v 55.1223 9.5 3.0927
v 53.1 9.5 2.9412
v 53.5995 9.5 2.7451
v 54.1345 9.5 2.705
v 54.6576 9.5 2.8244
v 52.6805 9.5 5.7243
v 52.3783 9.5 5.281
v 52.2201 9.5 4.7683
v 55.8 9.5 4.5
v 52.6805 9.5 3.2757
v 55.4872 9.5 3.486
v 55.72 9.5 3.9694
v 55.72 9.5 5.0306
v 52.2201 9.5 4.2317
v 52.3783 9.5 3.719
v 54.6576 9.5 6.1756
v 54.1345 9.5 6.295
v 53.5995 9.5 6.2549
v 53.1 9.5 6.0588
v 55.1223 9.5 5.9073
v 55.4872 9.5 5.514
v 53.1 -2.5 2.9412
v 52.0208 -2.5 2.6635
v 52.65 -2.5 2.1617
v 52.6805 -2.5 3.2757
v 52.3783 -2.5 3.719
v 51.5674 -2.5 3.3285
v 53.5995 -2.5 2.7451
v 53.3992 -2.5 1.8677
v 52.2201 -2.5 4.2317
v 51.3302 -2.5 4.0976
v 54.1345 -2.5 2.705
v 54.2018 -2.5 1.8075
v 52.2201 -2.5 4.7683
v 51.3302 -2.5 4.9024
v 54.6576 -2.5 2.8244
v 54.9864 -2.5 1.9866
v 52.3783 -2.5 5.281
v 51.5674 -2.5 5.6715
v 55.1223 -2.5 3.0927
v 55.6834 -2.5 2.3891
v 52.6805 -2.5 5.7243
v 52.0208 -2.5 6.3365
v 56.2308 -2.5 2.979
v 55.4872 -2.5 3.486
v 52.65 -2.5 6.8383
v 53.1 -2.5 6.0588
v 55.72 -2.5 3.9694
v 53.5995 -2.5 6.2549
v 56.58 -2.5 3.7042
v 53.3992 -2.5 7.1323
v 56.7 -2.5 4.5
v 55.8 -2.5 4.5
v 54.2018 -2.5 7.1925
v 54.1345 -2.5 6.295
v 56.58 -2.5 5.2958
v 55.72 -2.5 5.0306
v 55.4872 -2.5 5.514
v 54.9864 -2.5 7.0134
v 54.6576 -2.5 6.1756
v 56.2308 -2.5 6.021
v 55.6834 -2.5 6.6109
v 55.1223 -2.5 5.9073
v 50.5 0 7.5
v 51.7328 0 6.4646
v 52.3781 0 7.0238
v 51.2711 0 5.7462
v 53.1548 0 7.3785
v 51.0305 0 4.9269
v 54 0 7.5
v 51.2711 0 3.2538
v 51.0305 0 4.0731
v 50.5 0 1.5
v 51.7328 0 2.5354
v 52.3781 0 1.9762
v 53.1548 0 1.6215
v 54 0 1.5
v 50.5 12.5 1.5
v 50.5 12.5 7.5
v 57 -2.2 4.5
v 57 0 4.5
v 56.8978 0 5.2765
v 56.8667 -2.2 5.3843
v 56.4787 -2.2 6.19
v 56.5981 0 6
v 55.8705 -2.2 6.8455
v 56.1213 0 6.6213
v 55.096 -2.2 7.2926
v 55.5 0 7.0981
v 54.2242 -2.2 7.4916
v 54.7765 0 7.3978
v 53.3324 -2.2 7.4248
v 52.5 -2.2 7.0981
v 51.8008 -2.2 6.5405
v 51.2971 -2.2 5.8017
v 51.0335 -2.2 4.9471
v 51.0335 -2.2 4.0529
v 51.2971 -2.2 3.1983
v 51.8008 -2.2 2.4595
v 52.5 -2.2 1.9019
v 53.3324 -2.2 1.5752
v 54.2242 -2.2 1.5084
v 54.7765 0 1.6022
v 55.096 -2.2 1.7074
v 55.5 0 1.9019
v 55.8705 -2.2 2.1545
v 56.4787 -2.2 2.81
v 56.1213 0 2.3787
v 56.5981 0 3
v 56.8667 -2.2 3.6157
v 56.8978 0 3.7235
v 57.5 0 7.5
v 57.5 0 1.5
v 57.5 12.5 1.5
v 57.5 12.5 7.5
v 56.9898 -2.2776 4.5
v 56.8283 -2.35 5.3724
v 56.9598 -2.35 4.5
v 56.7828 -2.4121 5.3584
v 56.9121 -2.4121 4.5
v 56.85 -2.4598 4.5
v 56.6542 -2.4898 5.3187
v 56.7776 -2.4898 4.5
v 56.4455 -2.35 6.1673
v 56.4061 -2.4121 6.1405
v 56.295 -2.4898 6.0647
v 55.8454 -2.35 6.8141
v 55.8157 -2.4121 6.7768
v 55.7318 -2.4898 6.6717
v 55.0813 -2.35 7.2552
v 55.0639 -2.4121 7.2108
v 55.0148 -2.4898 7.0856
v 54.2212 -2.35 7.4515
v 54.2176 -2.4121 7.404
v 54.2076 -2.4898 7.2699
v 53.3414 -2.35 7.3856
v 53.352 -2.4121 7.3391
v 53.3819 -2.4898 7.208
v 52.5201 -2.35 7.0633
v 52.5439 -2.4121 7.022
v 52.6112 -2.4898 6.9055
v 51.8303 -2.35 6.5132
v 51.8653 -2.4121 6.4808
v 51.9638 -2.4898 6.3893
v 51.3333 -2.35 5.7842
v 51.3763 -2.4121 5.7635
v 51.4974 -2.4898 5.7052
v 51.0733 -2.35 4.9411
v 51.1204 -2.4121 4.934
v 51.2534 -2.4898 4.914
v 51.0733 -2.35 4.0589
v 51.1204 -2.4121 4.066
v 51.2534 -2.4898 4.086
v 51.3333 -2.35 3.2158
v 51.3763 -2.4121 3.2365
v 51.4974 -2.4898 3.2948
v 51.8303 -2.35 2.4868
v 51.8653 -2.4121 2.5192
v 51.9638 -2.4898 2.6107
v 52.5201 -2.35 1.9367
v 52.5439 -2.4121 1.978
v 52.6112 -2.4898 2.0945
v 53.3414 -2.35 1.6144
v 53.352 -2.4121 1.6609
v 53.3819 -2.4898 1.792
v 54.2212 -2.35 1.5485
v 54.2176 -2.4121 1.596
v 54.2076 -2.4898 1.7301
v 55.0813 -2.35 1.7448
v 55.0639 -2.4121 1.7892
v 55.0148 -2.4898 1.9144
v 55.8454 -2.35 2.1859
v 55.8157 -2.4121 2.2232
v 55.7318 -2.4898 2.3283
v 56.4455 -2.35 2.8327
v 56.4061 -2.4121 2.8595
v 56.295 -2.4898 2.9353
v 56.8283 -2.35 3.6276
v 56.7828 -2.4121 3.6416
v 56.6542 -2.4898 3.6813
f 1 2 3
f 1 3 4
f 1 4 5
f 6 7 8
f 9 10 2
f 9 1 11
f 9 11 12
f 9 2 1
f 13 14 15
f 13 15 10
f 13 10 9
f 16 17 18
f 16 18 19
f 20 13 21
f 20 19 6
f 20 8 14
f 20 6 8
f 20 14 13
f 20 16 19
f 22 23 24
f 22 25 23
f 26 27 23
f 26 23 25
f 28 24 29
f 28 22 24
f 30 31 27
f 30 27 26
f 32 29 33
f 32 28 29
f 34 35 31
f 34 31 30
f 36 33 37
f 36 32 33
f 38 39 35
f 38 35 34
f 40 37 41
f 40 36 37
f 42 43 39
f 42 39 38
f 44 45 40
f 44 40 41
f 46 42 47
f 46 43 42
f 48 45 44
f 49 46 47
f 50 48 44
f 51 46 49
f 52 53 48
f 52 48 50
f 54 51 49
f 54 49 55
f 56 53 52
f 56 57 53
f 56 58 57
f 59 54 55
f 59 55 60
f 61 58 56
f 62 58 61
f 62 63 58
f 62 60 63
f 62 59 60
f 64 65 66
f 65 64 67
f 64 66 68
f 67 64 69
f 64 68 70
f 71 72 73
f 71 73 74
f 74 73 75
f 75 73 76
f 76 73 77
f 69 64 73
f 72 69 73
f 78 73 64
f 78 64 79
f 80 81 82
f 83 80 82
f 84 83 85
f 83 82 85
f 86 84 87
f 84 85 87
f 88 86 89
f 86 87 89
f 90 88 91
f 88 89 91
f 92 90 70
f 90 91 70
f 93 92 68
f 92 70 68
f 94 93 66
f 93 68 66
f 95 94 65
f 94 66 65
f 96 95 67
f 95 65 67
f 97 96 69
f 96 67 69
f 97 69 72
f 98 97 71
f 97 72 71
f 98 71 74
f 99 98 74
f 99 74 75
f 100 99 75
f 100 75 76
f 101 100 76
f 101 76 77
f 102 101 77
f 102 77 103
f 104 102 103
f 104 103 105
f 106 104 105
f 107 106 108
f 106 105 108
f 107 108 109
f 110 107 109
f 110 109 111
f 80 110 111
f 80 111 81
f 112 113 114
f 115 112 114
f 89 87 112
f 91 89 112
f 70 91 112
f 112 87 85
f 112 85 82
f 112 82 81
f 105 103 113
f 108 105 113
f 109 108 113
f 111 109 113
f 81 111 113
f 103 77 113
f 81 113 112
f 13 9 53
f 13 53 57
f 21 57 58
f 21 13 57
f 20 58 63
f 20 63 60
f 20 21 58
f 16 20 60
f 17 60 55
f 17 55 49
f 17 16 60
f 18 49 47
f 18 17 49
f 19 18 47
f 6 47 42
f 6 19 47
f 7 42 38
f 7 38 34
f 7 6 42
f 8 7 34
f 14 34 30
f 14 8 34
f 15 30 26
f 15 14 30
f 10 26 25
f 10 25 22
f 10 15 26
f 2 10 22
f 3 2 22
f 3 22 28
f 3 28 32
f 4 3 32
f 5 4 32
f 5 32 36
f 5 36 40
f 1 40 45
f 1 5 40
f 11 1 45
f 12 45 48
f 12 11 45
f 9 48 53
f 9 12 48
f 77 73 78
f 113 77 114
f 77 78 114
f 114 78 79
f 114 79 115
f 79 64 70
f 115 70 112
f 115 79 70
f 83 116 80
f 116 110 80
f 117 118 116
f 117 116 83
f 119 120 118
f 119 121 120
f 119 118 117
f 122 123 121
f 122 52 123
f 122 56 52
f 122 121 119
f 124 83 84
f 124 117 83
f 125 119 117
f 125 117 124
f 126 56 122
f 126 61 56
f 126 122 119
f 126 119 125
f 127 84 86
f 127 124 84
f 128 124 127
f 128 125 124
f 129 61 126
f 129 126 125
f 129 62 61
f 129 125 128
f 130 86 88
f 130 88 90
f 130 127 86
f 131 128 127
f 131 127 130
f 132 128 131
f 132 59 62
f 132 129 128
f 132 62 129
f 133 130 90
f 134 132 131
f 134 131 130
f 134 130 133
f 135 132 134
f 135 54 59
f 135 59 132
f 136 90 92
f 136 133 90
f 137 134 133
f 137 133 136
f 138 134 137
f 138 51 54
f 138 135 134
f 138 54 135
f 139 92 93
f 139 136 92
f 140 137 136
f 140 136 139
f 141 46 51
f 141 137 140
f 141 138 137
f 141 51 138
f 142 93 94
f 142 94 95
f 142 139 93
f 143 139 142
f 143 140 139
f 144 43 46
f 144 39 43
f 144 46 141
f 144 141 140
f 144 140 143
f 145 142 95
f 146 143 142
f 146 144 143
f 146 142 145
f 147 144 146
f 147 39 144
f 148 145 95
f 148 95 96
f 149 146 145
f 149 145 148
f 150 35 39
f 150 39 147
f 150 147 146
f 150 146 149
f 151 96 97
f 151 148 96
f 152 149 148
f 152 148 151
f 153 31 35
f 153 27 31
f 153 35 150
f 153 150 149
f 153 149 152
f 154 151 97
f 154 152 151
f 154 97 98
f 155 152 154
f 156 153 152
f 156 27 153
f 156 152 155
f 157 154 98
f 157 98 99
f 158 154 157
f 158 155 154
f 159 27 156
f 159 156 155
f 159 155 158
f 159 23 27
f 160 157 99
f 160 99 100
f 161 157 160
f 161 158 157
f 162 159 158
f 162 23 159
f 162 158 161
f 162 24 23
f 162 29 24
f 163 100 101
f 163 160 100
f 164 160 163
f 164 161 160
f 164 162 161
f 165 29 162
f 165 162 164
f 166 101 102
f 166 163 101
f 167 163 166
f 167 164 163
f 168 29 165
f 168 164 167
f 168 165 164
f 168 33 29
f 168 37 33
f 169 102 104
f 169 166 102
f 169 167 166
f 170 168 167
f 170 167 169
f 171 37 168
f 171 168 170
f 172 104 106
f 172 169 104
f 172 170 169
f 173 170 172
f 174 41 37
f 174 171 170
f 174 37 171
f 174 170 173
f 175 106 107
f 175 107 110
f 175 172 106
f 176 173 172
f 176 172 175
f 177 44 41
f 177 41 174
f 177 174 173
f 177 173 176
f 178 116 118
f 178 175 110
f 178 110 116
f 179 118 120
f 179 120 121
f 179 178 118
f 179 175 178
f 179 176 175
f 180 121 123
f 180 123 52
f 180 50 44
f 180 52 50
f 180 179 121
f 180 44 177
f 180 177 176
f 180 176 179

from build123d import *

# Parameters (mm, degrees)
CYLINDER002_R     = 1.8
CYLINDER002_DEPTH = 12
CYLINDER001_R     = 3
CYLINDER001_DEPTH = 2.5
BOX054_W          = 7
BOX054_H          = 12.5
BOX054_DEPTH      = 6
FILLET010_R       = 0.3


with BuildPart() as cylinder:
    # Cylinder002 → Cylinder002 (new body)
    with BuildSketch(Plane(origin=(0, 9.5, 3), x_dir=(1, 0, 0), z_dir=(0, -1, 0))):
        Circle(CYLINDER002_R)
    extrude(amount=CYLINDER002_DEPTH)


with BuildPart() as cylinder001:
    # Cylinder001 → Cylinder001 (new body)
    with BuildSketch(Plane(origin=(0, 0, 3), x_dir=(1, 0, 0), z_dir=(0, -1, 0))):
        Circle(CYLINDER001_R)
    extrude(amount=CYLINDER001_DEPTH)


with BuildPart() as phone_socket_audio_video:
    # Box054 → Box054 (new body)
    with BuildSketch(Plane(origin=(-3.5, 0, 0), x_dir=(1, 0, 0), z_dir=(0, 0, 1))):
        with Locations((3.5, 6.25)):
            Rectangle(BOX054_W, BOX054_H)
    extrude(amount=BOX054_DEPTH)

    # Fusion043: union Cylinder001
    add(cylinder001.part)

    # Cut010: cut Cylinder
    add(cylinder.part, mode=Mode.SUBTRACT)

    # Fillet010
    fillet010_edges = [phone_socket_audio_video.edges().sort_by_distance(p)[0] for p in [
        (-3, -2.5, 3),
    ]]
    fillet(fillet010_edges, radius=FILLET010_R)


with BuildPart() as phone_socket_audio_video_1:
    # Fillet010 placement: moved
    add(phone_socket_audio_video.part.moved(Location((54, 0, 1.5))))


solid = phone_socket_audio_video_1.part
